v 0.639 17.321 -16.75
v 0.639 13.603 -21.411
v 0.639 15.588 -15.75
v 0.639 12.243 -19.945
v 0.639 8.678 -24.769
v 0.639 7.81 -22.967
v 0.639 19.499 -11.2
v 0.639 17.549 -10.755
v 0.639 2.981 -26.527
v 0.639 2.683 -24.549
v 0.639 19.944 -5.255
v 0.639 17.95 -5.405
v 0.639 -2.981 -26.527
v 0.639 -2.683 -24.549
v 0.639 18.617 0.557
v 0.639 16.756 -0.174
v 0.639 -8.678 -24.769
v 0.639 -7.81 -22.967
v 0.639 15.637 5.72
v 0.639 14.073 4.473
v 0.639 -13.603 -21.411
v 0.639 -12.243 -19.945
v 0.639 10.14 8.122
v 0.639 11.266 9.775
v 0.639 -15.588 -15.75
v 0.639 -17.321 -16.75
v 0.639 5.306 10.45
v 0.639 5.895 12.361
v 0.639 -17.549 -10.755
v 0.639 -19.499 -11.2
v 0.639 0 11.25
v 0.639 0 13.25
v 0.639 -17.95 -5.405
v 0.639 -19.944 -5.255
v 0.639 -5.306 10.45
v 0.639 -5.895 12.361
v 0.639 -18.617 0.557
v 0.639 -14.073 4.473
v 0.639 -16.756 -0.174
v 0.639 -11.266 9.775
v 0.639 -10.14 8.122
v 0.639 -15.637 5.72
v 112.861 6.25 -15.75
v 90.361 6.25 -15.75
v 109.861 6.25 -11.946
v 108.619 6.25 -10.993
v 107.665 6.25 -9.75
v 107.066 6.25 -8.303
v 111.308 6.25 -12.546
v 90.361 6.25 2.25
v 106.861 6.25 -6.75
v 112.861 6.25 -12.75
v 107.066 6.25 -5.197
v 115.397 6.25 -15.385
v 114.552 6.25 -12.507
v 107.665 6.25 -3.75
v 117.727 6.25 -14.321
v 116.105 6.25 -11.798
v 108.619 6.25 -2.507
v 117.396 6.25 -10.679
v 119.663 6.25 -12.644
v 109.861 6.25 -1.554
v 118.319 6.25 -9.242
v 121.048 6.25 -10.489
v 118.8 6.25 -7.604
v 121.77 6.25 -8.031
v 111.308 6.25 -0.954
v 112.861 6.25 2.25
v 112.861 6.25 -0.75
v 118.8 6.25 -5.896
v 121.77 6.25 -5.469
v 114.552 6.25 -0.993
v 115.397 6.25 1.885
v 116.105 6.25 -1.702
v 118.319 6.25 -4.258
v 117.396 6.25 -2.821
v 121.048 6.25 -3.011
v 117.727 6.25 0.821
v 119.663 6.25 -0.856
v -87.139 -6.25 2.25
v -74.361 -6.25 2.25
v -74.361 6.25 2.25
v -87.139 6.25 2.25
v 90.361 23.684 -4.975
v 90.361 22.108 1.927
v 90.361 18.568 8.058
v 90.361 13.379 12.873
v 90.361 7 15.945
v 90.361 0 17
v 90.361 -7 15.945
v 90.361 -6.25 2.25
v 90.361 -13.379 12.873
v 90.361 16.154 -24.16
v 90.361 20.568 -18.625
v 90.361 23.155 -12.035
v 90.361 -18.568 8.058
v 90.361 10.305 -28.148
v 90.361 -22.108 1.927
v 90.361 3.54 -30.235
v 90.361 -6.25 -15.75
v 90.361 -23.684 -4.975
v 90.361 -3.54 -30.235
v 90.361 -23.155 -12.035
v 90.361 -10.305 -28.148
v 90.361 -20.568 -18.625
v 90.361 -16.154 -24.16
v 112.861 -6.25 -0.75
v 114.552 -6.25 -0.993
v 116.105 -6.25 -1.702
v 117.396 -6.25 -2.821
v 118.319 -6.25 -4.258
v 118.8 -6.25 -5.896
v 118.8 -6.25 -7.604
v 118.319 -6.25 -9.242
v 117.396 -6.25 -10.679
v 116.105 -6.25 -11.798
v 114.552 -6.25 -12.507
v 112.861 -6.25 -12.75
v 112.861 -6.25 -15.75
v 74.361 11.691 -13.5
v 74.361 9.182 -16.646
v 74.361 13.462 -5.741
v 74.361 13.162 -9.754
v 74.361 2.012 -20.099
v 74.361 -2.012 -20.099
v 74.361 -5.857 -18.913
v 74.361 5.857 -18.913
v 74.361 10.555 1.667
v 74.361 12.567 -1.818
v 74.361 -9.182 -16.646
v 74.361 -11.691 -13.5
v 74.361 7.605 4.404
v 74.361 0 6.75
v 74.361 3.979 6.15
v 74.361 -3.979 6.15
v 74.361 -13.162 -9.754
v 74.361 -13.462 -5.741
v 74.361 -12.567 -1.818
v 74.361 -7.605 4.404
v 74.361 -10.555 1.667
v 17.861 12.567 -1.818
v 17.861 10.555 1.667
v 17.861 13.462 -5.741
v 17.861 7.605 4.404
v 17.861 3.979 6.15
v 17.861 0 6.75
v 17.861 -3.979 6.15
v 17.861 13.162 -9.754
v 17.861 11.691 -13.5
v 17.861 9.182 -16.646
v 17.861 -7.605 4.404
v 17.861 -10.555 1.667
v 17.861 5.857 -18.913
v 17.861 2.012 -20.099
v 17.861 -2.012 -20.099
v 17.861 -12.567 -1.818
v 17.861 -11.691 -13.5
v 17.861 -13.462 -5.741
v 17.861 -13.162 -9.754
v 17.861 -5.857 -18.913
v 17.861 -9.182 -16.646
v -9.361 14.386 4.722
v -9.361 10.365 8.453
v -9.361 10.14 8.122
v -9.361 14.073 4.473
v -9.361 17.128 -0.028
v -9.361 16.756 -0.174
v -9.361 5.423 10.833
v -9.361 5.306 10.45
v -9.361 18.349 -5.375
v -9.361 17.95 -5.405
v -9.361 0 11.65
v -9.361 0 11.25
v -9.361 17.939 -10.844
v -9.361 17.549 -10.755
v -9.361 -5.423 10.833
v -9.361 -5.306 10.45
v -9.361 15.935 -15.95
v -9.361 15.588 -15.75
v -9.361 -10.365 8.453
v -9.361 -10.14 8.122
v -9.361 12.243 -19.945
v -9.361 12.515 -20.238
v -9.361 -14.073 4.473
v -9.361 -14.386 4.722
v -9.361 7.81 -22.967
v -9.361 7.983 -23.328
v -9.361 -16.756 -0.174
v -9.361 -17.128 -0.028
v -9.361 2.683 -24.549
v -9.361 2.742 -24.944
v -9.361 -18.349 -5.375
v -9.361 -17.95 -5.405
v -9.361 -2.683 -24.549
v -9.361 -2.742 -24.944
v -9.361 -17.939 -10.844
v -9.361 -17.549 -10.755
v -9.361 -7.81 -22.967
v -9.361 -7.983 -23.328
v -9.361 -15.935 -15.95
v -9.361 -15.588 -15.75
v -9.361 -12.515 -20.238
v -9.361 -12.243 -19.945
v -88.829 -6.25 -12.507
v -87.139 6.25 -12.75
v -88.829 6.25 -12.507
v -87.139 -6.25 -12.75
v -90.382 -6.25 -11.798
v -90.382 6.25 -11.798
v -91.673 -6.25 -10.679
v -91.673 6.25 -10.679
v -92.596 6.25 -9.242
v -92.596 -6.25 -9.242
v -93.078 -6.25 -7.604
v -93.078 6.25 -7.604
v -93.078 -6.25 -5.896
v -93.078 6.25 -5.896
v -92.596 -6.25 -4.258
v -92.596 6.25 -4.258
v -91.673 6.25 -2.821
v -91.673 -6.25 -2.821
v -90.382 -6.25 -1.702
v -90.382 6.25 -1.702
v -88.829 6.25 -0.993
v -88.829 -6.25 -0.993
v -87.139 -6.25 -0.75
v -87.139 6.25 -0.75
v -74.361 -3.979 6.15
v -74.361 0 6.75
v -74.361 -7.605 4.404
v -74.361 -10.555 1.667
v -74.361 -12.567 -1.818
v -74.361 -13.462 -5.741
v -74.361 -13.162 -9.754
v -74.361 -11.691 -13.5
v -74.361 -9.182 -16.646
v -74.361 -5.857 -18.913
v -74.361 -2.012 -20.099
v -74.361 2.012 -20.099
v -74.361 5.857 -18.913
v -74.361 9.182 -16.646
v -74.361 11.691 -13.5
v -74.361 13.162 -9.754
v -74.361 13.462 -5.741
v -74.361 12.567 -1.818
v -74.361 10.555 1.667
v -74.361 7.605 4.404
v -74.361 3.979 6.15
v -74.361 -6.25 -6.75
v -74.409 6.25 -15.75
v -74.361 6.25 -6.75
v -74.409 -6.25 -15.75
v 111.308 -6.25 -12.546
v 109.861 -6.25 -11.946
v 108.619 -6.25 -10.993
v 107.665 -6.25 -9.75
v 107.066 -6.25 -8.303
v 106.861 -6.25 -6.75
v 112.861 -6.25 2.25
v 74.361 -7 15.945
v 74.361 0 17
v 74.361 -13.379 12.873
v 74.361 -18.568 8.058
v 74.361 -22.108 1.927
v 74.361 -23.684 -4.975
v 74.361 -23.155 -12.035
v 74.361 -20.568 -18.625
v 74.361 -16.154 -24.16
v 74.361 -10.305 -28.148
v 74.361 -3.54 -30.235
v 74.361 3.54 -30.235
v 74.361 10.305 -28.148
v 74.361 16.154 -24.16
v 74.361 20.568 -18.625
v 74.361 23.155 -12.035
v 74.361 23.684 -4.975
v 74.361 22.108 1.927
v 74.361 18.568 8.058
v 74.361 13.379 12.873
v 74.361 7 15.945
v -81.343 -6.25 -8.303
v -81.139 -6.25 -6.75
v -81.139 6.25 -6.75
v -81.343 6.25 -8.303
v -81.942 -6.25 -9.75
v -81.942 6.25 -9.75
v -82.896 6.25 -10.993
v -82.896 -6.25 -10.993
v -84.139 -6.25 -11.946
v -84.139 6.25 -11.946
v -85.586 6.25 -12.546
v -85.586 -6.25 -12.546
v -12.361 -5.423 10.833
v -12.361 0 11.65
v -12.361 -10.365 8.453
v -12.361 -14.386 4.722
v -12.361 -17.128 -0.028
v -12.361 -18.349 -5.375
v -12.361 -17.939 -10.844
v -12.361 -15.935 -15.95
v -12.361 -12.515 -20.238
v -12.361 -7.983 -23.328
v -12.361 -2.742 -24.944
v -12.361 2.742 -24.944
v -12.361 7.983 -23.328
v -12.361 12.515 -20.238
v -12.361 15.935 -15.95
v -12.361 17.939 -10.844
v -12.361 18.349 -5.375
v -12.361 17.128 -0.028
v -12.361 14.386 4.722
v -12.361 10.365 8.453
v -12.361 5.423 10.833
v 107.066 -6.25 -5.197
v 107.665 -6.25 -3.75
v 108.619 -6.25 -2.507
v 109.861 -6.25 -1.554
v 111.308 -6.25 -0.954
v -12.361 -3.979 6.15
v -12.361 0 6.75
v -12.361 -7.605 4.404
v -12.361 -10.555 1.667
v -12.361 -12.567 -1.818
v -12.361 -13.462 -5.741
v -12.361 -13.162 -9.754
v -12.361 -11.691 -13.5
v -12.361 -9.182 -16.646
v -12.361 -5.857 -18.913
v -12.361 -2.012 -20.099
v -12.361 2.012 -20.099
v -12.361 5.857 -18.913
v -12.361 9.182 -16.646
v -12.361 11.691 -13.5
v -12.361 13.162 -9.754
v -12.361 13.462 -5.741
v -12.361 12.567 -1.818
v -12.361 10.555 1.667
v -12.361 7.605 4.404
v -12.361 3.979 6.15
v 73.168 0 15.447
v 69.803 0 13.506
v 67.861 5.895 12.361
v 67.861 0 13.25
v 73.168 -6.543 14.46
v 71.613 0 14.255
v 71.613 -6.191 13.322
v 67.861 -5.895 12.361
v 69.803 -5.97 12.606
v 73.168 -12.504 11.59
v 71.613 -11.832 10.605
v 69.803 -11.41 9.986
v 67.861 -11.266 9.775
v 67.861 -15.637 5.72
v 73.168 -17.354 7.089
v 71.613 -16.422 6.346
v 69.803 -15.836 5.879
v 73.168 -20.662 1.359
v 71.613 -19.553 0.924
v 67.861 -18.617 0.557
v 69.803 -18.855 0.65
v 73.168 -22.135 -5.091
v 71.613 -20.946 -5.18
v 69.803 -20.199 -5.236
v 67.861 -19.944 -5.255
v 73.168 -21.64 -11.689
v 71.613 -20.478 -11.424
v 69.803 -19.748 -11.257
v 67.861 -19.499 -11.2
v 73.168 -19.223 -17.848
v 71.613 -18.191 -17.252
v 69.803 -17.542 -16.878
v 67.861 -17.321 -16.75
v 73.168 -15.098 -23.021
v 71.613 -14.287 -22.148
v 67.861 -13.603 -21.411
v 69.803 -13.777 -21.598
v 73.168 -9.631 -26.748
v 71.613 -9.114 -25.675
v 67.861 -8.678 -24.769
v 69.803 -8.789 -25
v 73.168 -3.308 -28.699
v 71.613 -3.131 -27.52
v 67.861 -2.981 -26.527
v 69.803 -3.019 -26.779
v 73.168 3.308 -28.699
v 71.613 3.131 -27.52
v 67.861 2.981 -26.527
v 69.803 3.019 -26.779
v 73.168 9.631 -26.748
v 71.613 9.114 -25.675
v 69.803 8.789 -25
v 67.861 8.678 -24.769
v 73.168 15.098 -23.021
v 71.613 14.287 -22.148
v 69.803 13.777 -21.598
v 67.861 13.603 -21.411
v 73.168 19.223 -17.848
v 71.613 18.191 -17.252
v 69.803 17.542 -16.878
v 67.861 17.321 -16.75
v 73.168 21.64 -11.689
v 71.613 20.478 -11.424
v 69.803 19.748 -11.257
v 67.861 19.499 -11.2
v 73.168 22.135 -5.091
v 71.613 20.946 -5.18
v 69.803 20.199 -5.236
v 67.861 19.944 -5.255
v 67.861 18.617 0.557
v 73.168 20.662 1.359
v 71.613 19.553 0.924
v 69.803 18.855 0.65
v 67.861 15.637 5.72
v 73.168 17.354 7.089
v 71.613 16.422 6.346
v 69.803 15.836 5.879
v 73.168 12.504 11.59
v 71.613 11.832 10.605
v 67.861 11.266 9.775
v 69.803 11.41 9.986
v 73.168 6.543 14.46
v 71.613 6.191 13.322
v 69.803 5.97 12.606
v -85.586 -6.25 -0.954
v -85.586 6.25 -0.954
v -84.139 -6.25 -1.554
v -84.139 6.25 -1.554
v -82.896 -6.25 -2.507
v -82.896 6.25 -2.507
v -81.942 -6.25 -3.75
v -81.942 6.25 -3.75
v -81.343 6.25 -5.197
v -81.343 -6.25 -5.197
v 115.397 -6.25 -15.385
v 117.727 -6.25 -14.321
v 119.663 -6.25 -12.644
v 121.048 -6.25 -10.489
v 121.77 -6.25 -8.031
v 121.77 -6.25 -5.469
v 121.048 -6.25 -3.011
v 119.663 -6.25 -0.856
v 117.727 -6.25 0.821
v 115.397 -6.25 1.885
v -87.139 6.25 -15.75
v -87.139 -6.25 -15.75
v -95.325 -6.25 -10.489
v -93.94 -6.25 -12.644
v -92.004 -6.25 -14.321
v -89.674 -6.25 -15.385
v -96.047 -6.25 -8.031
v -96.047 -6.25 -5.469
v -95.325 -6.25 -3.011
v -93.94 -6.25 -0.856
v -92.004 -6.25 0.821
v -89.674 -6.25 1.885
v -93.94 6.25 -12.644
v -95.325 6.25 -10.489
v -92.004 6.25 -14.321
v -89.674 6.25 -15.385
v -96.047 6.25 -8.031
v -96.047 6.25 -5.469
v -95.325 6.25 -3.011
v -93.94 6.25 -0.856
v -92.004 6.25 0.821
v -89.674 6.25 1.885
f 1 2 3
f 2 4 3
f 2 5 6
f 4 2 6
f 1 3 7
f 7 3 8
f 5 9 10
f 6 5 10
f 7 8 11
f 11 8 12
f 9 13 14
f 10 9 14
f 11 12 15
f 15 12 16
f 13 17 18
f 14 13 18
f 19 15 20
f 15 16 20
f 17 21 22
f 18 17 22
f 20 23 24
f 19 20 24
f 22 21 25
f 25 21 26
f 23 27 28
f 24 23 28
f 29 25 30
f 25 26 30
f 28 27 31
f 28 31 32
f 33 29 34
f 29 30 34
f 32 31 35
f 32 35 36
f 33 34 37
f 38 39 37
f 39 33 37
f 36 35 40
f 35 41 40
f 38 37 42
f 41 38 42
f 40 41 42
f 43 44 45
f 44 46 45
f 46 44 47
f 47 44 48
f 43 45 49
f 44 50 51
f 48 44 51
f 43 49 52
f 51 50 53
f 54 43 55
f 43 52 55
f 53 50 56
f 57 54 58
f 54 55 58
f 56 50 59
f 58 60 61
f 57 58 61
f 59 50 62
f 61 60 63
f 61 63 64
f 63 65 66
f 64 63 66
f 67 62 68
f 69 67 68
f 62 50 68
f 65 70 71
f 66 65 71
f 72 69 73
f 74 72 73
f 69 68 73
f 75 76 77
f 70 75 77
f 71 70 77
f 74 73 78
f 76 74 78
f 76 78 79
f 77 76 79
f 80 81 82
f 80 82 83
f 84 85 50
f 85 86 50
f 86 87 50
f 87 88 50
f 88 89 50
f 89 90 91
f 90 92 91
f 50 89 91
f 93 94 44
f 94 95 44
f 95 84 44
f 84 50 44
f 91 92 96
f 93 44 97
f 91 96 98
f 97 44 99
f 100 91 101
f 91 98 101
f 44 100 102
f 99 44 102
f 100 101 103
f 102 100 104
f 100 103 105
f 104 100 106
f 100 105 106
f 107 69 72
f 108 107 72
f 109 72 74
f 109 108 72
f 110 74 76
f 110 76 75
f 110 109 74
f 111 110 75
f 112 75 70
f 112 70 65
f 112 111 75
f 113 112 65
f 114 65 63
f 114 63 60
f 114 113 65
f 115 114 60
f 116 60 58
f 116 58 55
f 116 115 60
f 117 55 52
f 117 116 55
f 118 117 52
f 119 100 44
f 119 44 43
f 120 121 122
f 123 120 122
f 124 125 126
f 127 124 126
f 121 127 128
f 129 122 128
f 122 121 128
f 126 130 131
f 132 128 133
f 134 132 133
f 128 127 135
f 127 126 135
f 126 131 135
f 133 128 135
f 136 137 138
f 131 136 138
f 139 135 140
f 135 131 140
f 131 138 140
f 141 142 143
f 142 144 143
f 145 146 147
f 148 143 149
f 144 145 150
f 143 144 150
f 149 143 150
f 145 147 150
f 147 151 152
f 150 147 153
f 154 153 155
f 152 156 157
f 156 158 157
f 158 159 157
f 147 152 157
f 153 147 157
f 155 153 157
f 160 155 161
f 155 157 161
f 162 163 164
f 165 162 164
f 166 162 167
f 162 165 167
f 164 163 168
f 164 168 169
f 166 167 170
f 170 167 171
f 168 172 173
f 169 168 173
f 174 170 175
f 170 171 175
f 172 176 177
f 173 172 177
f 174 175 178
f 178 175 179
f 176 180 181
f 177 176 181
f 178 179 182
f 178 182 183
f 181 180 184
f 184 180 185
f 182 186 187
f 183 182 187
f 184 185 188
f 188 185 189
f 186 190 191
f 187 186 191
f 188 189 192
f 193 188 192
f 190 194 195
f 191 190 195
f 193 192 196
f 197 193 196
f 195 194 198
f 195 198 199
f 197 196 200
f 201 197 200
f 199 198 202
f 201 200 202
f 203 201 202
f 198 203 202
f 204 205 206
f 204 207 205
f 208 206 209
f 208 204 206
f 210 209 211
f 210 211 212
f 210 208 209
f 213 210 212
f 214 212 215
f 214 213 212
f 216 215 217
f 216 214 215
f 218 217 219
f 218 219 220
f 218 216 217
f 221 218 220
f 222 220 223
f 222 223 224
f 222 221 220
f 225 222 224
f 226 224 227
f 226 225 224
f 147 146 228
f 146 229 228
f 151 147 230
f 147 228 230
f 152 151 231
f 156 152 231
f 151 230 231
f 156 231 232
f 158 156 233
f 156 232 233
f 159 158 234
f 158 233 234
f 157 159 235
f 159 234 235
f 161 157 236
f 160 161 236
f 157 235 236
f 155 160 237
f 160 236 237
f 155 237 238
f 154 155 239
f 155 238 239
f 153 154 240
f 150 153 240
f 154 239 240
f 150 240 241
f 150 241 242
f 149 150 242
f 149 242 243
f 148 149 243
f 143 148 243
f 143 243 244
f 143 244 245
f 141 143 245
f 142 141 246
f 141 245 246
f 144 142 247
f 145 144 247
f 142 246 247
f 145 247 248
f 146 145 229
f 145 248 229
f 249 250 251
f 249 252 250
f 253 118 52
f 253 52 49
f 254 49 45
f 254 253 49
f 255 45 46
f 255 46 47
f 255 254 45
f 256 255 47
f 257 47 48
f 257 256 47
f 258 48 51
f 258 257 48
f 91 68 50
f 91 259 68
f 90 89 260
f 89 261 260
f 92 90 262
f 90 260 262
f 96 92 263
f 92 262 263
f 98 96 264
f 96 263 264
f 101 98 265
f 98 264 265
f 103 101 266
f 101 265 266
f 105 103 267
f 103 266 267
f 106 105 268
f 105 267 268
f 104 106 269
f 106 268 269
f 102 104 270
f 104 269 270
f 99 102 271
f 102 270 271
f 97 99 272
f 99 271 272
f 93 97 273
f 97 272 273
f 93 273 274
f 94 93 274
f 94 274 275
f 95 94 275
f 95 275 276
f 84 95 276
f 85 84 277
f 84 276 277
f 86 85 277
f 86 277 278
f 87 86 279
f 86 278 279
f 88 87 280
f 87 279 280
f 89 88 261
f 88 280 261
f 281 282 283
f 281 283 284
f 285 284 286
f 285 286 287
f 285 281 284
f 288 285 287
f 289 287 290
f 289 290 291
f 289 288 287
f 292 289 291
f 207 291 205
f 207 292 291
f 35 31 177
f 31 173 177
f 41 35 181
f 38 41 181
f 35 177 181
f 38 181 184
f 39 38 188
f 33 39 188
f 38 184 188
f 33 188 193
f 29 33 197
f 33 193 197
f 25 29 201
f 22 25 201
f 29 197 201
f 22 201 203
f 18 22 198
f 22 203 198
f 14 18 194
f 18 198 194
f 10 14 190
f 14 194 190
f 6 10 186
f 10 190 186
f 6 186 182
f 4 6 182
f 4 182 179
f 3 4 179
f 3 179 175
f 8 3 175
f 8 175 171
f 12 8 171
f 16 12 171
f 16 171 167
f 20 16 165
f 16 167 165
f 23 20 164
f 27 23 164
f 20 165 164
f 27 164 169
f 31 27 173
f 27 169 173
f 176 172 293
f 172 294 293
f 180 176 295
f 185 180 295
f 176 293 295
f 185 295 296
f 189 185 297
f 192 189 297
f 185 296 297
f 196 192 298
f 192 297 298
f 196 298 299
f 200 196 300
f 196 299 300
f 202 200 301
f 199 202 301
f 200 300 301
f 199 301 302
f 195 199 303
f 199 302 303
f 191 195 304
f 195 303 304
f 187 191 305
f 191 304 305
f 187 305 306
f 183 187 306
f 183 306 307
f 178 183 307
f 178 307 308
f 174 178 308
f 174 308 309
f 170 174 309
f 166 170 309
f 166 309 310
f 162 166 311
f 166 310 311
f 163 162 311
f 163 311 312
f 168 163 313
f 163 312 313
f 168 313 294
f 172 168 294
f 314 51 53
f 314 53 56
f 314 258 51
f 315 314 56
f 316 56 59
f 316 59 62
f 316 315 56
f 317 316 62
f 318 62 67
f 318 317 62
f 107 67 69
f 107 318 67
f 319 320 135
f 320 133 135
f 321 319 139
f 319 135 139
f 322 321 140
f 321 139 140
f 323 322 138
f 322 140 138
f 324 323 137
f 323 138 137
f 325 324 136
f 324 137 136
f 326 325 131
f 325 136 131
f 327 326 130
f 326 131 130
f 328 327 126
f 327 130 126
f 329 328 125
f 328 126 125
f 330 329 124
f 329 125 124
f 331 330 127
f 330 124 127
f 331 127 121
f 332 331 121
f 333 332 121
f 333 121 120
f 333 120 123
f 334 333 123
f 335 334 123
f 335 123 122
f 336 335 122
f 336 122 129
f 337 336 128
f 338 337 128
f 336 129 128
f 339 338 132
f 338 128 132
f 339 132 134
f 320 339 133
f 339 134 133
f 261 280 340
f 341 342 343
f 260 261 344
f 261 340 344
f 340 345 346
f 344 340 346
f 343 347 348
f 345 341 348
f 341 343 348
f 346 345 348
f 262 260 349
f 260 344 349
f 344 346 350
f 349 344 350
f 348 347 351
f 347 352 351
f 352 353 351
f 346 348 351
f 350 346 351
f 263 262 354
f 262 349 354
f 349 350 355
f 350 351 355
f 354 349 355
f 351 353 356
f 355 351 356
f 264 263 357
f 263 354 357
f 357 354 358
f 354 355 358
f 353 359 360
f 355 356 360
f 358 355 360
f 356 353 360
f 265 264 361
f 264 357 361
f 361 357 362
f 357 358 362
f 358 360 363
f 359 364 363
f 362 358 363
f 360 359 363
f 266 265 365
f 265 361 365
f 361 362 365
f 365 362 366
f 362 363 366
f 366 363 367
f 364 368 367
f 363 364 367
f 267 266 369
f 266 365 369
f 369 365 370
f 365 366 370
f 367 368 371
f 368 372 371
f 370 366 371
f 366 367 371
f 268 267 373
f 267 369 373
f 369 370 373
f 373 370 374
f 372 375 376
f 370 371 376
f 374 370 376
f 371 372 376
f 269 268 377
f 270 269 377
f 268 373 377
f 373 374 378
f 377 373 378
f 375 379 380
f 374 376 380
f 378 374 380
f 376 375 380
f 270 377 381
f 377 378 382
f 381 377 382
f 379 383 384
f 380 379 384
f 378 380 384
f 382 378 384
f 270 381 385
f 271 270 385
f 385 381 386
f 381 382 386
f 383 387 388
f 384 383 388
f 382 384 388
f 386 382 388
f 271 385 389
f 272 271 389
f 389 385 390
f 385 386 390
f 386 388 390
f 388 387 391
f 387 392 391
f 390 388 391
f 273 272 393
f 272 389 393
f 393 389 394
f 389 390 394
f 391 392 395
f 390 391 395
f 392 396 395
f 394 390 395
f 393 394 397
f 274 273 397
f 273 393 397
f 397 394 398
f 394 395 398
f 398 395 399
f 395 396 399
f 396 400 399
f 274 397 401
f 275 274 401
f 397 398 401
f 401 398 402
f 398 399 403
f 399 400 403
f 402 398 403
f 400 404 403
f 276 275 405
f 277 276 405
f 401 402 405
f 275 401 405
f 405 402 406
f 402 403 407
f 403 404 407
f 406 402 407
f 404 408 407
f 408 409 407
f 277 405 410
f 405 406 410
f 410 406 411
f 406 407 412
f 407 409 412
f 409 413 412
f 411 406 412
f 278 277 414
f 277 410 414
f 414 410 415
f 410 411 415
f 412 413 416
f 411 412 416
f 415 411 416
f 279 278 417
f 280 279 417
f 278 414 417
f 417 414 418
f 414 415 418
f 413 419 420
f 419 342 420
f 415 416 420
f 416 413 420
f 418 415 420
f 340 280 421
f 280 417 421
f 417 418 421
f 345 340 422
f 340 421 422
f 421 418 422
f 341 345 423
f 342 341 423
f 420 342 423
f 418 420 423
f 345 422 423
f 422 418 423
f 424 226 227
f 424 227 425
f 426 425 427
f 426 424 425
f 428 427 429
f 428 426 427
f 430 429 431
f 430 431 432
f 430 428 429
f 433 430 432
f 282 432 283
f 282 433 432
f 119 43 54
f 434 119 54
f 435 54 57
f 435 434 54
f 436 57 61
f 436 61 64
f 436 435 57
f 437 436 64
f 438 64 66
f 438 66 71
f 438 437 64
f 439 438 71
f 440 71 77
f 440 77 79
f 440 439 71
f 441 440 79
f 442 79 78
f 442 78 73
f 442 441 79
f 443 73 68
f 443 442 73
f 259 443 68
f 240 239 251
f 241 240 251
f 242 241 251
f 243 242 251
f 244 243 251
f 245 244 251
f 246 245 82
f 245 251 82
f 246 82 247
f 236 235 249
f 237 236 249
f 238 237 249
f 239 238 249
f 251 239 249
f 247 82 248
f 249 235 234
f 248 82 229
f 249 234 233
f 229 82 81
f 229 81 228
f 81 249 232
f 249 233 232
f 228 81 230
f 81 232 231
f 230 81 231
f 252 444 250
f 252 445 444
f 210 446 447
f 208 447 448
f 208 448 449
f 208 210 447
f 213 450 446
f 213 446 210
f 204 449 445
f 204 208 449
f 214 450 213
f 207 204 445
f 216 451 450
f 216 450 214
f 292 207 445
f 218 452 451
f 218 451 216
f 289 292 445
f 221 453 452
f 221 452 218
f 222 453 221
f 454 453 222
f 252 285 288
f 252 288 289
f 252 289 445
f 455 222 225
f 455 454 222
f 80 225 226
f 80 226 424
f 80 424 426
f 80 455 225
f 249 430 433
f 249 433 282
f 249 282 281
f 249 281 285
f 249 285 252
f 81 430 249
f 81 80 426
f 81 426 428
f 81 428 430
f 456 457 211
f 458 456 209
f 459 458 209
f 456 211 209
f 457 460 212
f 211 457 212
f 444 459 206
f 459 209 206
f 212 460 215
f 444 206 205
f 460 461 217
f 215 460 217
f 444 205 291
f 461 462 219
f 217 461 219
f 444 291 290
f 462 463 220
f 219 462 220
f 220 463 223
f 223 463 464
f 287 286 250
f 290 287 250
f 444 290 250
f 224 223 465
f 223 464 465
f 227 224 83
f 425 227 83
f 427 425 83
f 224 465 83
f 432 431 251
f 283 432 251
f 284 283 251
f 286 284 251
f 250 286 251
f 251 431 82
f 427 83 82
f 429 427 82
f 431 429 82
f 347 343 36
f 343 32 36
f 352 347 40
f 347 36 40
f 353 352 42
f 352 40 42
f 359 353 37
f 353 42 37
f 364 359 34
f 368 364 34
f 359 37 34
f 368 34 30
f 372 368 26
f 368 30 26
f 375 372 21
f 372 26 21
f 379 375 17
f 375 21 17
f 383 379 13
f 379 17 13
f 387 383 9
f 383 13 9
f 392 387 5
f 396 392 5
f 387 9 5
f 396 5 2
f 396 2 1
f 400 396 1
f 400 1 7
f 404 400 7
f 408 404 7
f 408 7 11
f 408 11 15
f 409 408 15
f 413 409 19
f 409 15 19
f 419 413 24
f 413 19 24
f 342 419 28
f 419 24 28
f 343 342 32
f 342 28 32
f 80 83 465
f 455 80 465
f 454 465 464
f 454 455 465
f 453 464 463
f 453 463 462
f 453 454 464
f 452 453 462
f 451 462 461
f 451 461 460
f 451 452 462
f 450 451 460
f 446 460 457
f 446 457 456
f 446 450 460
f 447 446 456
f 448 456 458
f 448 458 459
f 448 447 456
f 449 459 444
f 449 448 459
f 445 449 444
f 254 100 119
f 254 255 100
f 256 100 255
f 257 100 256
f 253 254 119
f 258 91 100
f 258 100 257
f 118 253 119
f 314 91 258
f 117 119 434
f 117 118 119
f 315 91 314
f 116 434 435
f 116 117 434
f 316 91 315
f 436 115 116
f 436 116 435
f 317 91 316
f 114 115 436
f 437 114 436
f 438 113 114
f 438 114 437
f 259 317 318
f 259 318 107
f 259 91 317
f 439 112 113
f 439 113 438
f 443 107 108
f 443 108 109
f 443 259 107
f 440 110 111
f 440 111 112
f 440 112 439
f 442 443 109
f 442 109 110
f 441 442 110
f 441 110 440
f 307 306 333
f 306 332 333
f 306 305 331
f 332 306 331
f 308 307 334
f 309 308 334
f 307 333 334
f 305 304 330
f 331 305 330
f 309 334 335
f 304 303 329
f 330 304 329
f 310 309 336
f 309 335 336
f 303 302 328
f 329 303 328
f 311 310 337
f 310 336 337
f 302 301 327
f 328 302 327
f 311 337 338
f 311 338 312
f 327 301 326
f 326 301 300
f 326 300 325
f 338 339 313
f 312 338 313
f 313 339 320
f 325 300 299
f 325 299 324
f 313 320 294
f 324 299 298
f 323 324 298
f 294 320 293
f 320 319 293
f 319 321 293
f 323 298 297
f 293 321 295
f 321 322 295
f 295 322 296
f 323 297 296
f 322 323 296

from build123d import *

# Parameters (mm, degrees)
F0_W     = 30.222708
F0_H     = 13.5
F3_DEPTH = 6.25
F4_DEPTH = 6.25


with BuildPart() as f1:
    # F0 (on Front) → F1 (revolve)
    with BuildSketch(Plane.XZ):
        with BuildLine():
            Line((-12.361354, 11.65), (-12.361354, 6.75))
            Line((-12.361354, 6.75), (17.861354, 6.75))
            Line((17.861354, 6.75), (74.361354, 6.75))
            Line((74.361354, 6.75), (74.361354, -6.75))
            Line((74.361354, -6.75), (90.361354, -6.75))
            Line((90.361354, -6.75), (90.361354, 2.25))
            Line((90.361354, 2.25), (90.361354, 17))
            Line((90.361354, 17), (74.361354, 17))
            ThreePointArc((74.361354, 17), (71.613437, 14.254723), (67.861354, 13.25))
            Line((67.861354, 13.25), (0.638646, 13.25))
            Line((0.638646, 13.25), (0.638646, 11.25))
            Line((0.638646, 11.25), (-9.361354, 11.25))
            Line((-9.361354, 11.25), (-9.361354, 11.65))
            Line((-9.361354, 11.65), (-12.361354, 11.65))
        make_face()
    revolve(axis=Axis((93.611354, 0, -6.75), (1, 0, 0)))

    # F0 (on Front) → F4 (join, symmetric)
    with BuildSketch(Plane.XZ):
        with BuildLine():
            Line((90.361354, 2.25), (90.361354, -6.75))
            Line((90.361354, -6.75), (103.861354, -6.75))
            ThreePointArc((103.861354, -6.75), (106.497393, -0.386039), (112.861354, 2.25))
            Line((112.861354, 2.25), (90.361354, 2.25))
        make_face()
        with BuildLine():
            Line((103.861354, -6.75), (90.361354, -6.75))
            Line((90.361354, -6.75), (90.361354, -15.75))
            Line((90.361354, -15.75), (112.861354, -15.75))
            ThreePointArc((112.861354, -15.75), (106.497393, -13.113961), (103.861354, -6.75))
        make_face()
        with BuildLine():
            ThreePointArc((112.861354, 2.25), (106.497393, -0.386039), (103.861354, -6.75))
            ThreePointArc((103.861354, -6.75), (106.497393, -13.113961), (112.861354, -15.75))
            ThreePointArc((112.861354, -15.75), (121.861354, -6.75), (112.861354, 2.25))
        make_face()
        with BuildLine():
            ThreePointArc((112.861354, -12.750001), (108.618712, -10.992641), (106.861353, -6.75))
            ThreePointArc((106.861353, -6.75), (108.618712, -2.507359), (112.861354, -0.749999))
            ThreePointArc((112.861354, -0.749999), (118.861355, -6.75), (112.861354, -12.750001))
        make_face(mode=Mode.SUBTRACT)
    extrude(amount=F4_DEPTH, both=True)


with BuildPart() as f2:
    # F0 (on Front) → F2 (revolve)
    with BuildSketch(Plane.XZ):
        Polygon((-74.361354, 2.25), (-74.361354, -6.75), (-12.361354, -6.75), (-12.361354, 6.75), (-74.361354, 6.75), align=None)
        with Locations((2.75, 0)):
            Rectangle(F0_W, F0_H)
    revolve(axis=Axis((0, 0, -6.75), (1, 0, 0)))

    # F0 (on Front) → F3 (join, symmetric)
    with BuildSketch(Plane.XZ):
        with BuildLine():
            ThreePointArc((-87.138646, -15.75), (-80.774685, -13.113961), (-78.138646, -6.75))
            ThreePointArc((-78.138646, -6.75), (-80.774685, -0.386039), (-87.138646, 2.25))
            ThreePointArc((-87.138646, 2.25), (-96.138646, -6.75), (-87.138646, -15.75))
        make_face()
        with BuildLine():
            ThreePointArc((-87.138646, -0.750004), (-82.896008, -2.507362), (-81.13865, -6.75))
            ThreePointArc((-81.13865, -6.75), (-82.896008, -10.992638), (-87.138646, -12.749996))
            ThreePointArc((-87.138646, -12.749996), (-93.138643, -6.75), (-87.138646, -0.750004))
        make_face(mode=Mode.SUBTRACT)
        with BuildLine():
            Line((-78.138646, -6.75), (-74.361354, -6.75))
            Line((-74.361354, -6.75), (-74.361354, 2.25))
            Line((-74.361354, 2.25), (-87.138646, 2.25))
            ThreePointArc((-87.138646, 2.25), (-80.774685, -0.386039), (-78.138646, -6.75))
        make_face()
        with BuildLine():
            Line((-74.408591, -15.75), (-74.361354, -6.75))
            Line((-74.361354, -6.75), (-78.138646, -6.75))
            ThreePointArc((-78.138646, -6.75), (-80.774685, -13.113961), (-87.138646, -15.75))
            Line((-87.138646, -15.75), (-74.408591, -15.75))
        make_face()
    extrude(amount=F3_DEPTH, both=True)


solid = Compound([f1.part, f2.part])
